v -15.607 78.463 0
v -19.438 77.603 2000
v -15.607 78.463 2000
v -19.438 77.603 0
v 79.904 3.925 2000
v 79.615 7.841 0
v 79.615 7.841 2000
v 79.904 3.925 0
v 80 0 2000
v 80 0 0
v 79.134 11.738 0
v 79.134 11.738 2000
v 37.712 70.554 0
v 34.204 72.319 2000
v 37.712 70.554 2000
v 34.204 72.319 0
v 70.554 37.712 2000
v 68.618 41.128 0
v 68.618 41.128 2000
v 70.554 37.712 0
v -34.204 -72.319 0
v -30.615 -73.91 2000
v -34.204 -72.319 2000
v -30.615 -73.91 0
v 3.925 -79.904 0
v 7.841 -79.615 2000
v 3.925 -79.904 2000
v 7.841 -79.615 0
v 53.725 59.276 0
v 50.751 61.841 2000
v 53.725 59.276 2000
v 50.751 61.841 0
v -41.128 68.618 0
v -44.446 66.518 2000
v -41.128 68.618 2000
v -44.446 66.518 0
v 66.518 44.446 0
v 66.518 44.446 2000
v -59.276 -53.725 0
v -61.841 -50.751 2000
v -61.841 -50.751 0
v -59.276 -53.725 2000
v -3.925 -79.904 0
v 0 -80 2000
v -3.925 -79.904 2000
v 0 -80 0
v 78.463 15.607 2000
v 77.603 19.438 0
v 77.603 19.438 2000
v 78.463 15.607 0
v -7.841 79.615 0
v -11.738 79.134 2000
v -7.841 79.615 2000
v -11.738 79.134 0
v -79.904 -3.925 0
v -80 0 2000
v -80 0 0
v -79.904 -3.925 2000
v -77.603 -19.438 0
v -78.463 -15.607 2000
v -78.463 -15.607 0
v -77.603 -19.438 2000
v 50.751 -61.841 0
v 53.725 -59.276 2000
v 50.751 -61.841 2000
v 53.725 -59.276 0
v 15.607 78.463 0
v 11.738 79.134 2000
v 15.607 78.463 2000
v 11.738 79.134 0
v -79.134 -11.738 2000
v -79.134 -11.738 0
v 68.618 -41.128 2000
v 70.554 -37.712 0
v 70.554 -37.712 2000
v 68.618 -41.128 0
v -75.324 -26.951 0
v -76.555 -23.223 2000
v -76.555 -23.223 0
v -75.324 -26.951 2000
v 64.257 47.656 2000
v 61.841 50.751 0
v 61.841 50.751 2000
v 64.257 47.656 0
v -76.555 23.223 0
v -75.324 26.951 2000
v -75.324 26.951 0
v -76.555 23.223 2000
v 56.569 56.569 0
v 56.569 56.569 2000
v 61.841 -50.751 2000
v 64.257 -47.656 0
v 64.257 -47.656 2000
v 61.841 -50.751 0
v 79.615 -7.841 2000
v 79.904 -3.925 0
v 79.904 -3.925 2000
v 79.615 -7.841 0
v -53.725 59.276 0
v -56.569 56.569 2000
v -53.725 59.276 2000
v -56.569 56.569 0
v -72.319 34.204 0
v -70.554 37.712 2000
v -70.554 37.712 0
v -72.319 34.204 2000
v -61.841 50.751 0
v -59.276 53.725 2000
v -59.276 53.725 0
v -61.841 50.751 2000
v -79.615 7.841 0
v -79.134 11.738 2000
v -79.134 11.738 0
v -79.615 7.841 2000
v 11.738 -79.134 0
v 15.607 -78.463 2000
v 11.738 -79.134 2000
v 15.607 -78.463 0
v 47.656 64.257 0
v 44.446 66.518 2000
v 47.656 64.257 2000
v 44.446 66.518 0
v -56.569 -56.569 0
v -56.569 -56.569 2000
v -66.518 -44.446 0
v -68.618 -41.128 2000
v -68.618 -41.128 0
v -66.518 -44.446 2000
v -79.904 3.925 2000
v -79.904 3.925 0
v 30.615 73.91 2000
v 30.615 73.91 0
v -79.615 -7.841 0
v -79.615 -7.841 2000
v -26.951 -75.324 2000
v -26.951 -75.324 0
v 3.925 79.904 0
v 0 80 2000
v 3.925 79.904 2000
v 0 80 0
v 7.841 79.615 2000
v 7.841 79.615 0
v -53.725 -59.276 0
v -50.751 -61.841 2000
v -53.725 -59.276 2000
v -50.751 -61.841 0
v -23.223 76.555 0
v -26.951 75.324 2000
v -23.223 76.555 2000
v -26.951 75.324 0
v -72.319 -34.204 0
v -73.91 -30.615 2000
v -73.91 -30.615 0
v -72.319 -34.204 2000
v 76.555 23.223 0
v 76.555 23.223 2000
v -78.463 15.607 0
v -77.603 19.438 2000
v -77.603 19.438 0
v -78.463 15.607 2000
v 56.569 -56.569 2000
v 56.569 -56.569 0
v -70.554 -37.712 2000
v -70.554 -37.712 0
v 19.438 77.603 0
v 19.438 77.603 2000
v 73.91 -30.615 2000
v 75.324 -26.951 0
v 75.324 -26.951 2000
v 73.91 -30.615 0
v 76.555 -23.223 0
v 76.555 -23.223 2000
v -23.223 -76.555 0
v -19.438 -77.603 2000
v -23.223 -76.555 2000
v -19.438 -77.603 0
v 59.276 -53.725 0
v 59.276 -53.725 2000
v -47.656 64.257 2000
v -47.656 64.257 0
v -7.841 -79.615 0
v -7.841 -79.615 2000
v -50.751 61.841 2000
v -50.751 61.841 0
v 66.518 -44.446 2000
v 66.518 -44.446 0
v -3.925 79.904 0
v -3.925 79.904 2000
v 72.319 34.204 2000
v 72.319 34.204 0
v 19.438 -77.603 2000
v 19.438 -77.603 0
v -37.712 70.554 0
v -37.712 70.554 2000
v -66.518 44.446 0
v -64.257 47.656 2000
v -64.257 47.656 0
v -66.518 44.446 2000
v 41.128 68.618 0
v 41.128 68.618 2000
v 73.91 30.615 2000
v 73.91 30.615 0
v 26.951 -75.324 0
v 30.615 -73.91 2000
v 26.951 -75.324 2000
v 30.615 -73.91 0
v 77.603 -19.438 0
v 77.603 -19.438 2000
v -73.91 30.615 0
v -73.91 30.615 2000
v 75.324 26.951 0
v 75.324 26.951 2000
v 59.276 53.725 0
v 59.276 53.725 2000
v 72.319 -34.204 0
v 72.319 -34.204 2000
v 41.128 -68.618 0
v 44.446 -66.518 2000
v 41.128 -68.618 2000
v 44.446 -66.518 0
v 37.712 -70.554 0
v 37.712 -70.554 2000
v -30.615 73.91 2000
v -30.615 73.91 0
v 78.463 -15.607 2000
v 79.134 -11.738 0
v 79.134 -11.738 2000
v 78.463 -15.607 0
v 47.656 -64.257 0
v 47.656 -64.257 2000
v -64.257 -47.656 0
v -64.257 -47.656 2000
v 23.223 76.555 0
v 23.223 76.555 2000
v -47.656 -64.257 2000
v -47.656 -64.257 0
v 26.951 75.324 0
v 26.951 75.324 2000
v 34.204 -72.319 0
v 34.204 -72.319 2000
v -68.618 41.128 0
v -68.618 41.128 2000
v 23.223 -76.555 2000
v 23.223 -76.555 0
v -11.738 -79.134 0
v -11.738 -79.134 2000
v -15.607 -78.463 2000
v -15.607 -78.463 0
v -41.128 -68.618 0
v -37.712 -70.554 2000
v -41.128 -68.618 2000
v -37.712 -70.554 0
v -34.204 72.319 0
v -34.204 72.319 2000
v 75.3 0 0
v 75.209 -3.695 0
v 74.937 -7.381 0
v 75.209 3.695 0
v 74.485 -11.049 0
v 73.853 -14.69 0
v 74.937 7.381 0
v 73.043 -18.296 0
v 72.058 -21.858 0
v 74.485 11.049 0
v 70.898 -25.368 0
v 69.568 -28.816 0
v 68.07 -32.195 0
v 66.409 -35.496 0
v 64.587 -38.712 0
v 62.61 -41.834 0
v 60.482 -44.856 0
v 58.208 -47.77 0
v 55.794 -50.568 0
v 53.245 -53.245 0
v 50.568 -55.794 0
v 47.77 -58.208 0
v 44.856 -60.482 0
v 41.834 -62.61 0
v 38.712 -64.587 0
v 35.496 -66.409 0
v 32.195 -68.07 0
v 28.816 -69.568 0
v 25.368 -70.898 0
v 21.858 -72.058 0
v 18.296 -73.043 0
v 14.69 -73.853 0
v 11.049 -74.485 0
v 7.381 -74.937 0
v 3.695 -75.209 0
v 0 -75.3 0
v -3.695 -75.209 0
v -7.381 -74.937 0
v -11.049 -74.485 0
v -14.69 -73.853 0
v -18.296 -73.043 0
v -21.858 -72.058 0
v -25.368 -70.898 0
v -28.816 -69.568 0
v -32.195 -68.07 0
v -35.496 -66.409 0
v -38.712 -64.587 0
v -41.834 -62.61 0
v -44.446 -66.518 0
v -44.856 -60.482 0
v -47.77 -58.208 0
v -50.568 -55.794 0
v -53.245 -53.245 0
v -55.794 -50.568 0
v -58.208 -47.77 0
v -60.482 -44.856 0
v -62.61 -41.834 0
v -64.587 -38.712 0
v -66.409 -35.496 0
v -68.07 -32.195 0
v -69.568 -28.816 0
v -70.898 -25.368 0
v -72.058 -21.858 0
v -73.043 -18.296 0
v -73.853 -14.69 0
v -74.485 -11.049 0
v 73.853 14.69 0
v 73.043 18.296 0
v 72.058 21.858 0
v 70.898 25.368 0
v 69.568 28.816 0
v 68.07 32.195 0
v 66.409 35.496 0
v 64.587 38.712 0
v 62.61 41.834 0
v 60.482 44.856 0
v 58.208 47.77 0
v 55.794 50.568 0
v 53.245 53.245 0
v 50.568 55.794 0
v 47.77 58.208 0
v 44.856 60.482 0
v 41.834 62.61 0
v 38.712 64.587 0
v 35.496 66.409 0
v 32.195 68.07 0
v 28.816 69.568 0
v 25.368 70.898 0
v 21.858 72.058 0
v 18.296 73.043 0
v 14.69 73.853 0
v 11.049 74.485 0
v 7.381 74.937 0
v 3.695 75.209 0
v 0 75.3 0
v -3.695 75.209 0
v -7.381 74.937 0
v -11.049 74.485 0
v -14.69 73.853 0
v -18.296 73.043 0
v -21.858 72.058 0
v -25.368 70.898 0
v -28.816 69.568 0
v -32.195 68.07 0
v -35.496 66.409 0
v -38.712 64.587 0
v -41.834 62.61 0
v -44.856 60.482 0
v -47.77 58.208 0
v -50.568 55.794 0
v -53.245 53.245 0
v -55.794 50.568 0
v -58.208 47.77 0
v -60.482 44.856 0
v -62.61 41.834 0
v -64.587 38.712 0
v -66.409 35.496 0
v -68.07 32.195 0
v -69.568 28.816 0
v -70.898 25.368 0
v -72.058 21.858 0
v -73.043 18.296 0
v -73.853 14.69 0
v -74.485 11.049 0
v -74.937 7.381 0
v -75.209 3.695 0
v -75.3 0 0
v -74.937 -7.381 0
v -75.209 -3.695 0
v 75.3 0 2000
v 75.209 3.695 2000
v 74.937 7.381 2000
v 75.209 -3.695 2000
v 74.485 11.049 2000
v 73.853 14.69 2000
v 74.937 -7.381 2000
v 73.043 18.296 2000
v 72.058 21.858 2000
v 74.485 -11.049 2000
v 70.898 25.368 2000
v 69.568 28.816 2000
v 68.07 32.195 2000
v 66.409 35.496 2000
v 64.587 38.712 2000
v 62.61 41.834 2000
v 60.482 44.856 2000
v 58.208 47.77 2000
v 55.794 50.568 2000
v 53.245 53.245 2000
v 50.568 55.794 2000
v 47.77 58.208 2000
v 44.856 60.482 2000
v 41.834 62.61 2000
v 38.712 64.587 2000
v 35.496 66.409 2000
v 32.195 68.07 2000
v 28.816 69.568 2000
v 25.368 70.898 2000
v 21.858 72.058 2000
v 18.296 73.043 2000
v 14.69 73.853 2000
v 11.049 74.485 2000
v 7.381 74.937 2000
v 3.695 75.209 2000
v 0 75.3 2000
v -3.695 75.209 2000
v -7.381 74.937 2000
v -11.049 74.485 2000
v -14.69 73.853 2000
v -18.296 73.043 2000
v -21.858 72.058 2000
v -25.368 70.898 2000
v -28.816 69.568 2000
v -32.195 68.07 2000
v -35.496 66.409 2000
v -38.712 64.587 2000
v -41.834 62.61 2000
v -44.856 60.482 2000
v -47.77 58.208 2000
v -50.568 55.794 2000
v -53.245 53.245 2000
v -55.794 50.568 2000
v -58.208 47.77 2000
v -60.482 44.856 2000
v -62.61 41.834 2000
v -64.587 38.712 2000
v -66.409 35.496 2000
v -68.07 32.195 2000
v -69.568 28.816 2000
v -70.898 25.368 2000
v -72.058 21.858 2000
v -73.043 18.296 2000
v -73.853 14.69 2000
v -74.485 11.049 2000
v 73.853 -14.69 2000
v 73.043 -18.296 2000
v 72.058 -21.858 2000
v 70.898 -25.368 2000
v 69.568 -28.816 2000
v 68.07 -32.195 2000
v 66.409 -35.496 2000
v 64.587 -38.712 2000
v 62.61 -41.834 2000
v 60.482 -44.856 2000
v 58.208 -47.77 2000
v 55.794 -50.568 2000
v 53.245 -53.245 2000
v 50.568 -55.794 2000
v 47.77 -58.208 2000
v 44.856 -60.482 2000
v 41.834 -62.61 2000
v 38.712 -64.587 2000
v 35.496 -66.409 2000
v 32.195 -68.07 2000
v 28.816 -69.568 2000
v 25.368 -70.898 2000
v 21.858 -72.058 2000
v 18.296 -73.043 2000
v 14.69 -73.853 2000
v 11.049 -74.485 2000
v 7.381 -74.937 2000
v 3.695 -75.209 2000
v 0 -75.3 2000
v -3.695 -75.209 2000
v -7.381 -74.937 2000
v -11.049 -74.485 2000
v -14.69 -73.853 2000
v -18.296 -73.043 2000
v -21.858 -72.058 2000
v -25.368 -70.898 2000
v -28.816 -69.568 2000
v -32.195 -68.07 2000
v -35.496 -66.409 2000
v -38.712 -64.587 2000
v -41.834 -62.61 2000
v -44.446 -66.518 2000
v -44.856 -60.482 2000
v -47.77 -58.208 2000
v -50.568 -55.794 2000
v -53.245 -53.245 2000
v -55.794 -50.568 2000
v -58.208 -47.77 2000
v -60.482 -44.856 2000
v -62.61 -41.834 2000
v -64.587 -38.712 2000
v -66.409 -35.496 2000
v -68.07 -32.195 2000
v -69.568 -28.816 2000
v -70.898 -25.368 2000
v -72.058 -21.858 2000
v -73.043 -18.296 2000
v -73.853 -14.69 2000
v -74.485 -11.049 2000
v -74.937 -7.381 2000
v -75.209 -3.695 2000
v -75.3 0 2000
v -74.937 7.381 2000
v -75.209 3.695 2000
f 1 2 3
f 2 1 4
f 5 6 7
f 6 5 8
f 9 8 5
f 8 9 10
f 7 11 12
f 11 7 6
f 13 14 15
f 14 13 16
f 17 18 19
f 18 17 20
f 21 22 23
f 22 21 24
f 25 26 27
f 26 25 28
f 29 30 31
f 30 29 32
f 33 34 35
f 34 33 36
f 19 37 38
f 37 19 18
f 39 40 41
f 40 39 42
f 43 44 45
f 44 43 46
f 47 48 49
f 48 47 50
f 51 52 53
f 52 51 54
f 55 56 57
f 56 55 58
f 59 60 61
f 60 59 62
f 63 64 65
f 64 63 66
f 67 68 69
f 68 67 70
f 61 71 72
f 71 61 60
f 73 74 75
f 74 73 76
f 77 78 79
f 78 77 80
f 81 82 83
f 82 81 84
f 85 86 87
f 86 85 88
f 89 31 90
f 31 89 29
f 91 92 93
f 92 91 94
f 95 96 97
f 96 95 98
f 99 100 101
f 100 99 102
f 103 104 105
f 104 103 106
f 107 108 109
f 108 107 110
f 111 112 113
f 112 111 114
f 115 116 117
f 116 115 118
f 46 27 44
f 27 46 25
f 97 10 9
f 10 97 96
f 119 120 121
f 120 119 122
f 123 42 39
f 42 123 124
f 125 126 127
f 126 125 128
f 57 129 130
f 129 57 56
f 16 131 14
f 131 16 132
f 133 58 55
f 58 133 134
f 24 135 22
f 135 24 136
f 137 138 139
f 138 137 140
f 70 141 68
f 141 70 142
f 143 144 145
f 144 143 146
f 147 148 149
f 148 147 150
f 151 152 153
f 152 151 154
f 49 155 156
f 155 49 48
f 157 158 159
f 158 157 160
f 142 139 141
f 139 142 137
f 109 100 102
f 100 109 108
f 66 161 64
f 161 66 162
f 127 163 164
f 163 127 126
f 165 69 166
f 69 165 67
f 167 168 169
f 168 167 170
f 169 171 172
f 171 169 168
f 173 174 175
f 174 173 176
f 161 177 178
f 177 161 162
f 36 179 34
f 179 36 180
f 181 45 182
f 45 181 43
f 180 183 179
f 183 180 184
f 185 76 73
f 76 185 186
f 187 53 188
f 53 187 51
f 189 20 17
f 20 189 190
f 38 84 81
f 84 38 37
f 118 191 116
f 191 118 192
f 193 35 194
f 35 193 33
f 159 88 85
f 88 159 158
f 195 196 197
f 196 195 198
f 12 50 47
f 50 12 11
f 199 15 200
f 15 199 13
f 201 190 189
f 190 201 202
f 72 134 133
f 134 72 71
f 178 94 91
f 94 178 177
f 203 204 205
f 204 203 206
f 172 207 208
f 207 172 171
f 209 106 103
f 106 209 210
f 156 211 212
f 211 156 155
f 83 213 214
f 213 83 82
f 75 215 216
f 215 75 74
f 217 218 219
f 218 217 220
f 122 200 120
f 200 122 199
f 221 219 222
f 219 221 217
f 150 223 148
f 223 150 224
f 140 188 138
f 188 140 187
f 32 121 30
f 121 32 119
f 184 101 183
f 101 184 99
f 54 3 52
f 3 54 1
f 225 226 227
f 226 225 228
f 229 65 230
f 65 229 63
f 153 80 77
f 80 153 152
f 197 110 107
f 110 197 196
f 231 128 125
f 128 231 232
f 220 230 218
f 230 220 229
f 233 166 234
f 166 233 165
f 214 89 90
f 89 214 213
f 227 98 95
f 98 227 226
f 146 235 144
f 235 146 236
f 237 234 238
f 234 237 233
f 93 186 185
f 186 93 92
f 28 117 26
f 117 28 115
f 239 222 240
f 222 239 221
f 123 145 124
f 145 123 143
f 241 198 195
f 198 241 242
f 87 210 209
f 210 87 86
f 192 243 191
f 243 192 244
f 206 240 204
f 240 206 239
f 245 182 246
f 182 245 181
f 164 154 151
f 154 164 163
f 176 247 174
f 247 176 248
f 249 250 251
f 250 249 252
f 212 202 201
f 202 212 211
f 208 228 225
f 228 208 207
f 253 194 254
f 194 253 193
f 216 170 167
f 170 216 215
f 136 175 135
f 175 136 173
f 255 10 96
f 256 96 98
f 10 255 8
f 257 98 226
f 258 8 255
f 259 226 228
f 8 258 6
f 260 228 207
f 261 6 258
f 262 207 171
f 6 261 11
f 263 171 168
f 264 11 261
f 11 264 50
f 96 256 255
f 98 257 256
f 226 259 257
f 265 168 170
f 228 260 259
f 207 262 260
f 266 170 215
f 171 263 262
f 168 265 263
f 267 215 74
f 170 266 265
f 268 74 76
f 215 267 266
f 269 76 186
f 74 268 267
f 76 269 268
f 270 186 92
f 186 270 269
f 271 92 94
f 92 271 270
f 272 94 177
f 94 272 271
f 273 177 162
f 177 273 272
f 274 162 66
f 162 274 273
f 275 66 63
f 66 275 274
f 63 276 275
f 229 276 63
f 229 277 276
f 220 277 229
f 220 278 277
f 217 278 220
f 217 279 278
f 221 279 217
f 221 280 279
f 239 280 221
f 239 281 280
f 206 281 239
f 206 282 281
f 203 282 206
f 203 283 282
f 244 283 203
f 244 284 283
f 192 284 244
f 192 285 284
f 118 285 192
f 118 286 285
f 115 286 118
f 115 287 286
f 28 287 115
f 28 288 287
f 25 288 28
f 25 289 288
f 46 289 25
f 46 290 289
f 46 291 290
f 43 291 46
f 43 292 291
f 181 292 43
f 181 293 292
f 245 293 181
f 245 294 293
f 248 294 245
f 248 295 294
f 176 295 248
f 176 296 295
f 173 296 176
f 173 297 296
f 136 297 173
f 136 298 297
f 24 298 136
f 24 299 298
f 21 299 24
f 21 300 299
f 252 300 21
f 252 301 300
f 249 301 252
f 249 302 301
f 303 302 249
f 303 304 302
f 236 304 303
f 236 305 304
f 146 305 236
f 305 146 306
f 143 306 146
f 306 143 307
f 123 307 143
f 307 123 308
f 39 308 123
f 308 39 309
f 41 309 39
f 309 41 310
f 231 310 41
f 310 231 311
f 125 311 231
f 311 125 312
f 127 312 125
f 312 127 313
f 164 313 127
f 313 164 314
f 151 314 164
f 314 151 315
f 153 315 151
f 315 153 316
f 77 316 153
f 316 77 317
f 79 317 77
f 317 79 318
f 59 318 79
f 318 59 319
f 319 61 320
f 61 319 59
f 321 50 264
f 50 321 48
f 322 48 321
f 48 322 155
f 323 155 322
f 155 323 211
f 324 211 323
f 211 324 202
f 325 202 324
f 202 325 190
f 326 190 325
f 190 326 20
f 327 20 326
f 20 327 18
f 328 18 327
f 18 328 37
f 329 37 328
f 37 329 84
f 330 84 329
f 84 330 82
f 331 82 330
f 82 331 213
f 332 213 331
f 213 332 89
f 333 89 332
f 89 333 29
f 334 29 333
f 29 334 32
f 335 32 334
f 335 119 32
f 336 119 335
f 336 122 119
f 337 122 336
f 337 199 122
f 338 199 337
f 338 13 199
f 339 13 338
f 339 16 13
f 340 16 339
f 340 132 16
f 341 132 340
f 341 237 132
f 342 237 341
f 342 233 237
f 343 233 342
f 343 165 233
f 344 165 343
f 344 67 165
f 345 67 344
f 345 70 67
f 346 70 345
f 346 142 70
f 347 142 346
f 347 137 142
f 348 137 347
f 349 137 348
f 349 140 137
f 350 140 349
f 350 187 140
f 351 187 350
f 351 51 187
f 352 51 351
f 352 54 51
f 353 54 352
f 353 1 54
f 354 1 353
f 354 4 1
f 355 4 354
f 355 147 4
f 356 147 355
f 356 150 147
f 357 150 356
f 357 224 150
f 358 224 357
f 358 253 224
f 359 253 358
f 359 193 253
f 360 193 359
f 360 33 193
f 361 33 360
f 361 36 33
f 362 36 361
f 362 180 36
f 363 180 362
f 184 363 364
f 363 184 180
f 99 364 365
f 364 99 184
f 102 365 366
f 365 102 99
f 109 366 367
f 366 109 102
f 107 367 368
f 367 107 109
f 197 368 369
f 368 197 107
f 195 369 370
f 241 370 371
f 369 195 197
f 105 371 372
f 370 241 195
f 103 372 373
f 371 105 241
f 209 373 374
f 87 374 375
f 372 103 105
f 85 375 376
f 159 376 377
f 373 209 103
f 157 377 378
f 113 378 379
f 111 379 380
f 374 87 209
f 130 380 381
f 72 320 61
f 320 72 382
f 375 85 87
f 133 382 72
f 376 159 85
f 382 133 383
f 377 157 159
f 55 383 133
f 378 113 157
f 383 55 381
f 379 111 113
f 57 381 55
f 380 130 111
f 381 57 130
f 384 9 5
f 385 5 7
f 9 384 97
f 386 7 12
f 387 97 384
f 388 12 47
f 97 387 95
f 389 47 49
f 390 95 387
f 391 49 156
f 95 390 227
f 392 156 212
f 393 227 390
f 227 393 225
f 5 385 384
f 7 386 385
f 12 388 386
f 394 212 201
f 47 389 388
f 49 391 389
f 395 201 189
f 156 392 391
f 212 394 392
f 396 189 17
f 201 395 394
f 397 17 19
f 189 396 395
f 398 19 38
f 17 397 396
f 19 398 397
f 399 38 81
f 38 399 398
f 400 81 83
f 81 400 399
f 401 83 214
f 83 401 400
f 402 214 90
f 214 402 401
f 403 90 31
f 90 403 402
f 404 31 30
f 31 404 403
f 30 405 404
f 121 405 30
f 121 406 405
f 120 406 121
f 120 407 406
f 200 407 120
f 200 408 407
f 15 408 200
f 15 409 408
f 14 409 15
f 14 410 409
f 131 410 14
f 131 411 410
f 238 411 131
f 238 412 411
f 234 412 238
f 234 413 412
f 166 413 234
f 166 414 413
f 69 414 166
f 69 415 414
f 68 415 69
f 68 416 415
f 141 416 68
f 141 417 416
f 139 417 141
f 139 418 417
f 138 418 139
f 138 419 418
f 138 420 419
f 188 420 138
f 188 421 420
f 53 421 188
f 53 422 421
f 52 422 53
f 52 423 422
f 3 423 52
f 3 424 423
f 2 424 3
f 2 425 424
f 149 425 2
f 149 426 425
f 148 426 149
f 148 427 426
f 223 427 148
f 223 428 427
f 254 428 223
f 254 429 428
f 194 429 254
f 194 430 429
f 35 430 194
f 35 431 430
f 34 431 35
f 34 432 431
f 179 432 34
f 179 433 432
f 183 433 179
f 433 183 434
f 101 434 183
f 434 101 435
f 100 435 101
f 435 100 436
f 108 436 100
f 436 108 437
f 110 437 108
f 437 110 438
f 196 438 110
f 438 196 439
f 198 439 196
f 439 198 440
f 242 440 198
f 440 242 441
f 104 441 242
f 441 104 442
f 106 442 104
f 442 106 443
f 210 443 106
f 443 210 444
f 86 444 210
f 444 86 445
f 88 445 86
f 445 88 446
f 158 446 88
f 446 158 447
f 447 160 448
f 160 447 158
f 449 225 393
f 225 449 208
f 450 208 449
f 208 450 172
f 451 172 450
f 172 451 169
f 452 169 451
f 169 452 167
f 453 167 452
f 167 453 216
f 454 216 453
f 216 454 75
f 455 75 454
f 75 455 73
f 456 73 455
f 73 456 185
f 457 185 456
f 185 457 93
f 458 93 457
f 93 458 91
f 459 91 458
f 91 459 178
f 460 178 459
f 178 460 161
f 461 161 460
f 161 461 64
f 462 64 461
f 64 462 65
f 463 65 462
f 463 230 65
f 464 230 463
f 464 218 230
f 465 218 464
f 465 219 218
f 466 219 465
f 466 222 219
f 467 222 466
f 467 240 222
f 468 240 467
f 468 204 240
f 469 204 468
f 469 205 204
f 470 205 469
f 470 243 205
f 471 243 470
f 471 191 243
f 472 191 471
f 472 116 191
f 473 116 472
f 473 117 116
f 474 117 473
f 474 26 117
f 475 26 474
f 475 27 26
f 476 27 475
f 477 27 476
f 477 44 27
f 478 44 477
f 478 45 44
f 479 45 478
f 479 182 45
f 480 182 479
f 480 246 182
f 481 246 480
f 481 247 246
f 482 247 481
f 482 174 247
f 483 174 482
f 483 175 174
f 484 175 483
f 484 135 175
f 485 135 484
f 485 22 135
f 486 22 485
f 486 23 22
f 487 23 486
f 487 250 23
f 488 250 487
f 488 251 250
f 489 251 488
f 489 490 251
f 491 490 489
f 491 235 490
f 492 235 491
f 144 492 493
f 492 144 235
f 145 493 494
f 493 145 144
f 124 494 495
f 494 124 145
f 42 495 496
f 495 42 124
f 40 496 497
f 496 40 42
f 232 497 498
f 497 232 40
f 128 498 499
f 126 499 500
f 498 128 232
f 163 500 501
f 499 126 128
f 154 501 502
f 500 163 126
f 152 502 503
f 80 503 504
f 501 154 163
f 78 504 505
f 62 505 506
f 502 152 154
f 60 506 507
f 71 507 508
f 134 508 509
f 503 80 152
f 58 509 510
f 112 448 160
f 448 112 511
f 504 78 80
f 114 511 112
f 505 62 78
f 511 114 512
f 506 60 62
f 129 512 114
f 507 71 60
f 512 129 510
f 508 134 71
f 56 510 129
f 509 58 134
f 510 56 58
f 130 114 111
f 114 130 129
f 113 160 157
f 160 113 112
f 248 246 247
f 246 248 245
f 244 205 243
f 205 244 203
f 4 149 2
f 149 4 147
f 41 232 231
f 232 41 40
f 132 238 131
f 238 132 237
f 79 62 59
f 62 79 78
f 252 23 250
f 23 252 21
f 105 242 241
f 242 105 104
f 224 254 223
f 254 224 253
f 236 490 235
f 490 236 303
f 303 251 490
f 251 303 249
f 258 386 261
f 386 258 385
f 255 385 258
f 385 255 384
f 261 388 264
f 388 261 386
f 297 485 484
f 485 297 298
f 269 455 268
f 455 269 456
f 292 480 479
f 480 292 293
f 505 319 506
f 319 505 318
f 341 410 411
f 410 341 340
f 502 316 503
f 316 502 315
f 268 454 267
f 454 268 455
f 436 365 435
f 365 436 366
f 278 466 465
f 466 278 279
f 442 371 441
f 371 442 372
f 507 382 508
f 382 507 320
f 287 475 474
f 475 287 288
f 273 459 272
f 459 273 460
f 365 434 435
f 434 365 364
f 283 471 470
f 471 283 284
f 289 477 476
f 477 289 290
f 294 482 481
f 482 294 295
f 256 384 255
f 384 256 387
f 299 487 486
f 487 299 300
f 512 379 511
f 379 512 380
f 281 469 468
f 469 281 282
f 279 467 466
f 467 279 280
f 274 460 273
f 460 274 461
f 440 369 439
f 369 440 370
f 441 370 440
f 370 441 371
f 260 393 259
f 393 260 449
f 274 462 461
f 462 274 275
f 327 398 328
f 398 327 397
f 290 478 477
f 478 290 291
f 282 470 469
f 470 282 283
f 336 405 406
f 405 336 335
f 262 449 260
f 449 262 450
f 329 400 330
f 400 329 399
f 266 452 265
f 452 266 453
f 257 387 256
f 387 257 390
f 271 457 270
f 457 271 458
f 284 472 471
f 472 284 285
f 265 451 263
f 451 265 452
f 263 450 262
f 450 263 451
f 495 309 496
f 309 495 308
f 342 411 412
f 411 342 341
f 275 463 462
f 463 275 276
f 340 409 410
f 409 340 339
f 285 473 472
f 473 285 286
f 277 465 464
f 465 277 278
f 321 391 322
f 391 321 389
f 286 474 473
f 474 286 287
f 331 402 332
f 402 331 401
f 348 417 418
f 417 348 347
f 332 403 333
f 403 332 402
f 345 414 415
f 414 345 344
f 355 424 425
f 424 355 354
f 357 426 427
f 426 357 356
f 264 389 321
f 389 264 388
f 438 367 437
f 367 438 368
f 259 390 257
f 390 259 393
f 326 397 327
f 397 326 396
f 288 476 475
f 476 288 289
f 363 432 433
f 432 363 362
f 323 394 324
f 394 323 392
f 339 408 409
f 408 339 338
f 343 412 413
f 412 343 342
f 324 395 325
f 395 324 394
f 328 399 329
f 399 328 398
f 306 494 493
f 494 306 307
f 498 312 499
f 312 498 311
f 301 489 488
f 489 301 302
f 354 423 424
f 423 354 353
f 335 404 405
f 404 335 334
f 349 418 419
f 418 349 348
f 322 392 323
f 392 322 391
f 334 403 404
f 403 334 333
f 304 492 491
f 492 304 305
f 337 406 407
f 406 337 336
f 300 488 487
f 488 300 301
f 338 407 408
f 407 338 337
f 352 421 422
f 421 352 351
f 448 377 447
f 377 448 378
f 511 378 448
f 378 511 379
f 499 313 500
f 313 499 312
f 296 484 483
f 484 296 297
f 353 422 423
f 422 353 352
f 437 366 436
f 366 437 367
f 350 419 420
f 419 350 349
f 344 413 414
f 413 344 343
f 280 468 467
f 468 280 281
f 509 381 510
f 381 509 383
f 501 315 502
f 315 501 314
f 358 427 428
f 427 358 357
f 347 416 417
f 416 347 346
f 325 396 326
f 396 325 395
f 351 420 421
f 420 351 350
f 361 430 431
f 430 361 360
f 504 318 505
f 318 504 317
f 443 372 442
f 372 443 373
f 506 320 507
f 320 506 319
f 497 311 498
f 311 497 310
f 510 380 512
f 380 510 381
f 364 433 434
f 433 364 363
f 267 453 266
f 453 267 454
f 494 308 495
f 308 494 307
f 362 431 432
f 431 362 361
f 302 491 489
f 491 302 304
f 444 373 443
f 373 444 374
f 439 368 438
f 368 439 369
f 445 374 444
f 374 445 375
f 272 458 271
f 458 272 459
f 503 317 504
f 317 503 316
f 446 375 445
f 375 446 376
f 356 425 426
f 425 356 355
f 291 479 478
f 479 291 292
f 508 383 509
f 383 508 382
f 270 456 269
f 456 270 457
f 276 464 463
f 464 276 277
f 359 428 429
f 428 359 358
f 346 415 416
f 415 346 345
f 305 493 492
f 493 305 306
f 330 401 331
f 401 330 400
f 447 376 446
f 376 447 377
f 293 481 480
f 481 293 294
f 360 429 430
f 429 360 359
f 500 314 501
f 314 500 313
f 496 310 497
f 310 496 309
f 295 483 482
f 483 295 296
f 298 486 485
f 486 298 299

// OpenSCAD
$fn = 128;

// HT pipe parameters (mm)
outer_d = 160;
length  = 2000;

// Typical HT pipe wall thickness (approx). Adjust if needed.
wall = 4.7;

module ht_pipe(od, L, t){
    id = od - 2*t;
    difference(){
        cylinder(h=L, d=od, center=false);
        translate([0,0,-0.1])
            cylinder(h=L+0.2, d=id, center=false);
    }
}

ht_pipe(outer_d, length, wall);
